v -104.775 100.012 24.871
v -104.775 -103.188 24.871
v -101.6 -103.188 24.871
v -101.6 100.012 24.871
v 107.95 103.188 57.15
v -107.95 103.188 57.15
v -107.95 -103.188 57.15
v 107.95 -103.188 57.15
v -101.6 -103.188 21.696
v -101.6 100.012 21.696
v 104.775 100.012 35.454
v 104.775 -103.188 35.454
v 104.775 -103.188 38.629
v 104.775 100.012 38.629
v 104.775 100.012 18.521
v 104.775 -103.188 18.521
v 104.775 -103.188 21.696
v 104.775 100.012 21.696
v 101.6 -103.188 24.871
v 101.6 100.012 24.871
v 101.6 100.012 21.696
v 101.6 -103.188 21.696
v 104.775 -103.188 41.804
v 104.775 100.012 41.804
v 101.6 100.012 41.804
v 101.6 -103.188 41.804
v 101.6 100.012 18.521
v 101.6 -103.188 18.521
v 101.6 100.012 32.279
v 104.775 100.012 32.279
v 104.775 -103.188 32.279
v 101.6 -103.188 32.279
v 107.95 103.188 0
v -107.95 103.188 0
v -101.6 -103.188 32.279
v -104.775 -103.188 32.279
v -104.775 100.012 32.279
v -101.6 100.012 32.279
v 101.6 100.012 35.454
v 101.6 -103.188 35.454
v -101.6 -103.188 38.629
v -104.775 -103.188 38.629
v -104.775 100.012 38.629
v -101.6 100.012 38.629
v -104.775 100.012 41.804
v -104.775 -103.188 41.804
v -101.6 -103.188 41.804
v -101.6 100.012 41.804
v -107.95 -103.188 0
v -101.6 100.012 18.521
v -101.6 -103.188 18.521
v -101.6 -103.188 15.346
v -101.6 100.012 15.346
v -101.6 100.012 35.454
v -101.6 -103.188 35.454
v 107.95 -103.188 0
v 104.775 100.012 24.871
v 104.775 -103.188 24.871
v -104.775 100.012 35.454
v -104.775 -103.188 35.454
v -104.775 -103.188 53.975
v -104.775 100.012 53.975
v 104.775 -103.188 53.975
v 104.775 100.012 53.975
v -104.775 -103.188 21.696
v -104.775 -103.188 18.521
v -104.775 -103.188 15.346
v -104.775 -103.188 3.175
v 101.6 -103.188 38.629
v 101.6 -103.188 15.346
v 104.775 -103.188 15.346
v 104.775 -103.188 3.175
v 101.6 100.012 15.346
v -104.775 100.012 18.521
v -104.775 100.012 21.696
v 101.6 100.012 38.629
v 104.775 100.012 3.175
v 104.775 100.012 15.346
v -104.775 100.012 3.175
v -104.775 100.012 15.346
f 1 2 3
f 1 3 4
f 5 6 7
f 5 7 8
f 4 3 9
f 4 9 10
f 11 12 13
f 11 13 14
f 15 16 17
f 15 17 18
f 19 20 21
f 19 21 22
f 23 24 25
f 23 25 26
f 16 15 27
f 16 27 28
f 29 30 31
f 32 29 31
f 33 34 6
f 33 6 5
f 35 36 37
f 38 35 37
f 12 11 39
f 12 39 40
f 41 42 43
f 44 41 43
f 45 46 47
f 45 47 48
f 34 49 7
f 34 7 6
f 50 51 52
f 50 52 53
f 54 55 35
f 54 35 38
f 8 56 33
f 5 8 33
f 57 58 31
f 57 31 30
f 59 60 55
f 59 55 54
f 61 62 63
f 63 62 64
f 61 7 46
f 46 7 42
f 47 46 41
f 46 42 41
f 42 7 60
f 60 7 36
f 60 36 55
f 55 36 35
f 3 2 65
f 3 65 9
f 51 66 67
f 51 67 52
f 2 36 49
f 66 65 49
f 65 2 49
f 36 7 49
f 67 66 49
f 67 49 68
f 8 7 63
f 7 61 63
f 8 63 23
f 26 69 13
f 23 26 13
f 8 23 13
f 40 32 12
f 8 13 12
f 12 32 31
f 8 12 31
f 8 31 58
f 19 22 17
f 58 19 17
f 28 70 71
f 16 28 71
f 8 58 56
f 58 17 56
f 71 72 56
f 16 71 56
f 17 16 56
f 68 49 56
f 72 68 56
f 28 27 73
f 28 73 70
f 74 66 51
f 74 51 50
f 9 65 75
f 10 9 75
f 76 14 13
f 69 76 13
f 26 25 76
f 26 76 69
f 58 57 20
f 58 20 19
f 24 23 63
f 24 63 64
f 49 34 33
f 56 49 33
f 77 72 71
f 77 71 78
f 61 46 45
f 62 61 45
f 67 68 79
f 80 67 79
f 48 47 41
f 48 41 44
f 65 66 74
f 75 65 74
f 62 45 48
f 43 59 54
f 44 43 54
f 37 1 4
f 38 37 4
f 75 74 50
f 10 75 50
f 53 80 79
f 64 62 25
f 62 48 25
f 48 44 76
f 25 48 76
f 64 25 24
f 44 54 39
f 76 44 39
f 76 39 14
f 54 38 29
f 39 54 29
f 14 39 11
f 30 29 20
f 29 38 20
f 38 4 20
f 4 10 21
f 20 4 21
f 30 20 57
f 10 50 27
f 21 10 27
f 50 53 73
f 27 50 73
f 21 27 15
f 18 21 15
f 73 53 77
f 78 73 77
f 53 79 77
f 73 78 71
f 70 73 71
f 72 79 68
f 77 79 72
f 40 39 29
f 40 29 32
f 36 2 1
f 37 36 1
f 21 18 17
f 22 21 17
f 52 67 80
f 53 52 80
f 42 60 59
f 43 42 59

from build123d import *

# Parameters (mm, degrees)
F0_W     = 215.9
F0_H     = 206.375
F1_DEPTH = 57.15
F2_T     = -3.175
F3_W     = 203.2
F3_H     = 3.175
F4_DEPTH = 3.175
F5_W     = 203.2
F5_H     = 3.175
F6_DEPTH = 3.175


with BuildPart() as f1:
    # F0 (on Top) → F1 (new body)
    with BuildSketch(Plane.XY):
        Rectangle(F0_W, F0_H)
    extrude(amount=F1_DEPTH)

    # F2
    f2_openings = [f1.faces().sort_by_distance(p)[0] for p in [
        (0, -103.1875, 28.575),
    ]]
    offset(amount=F2_T, openings=f2_openings)

    # F3 (on face) → F4 (join)
    with BuildSketch(Plane.YZ.offset(-104.775)):
        with Locations((-1.5875, 40.2166666663)):
            Rectangle(F3_W, F3_H)
        with Locations((-1.5875, 33.8666666663)):
            Rectangle(F3_W, F3_H)
        with Locations((-1.5875, 23.2833333337)):
            Rectangle(F3_W, F3_H)
        with Locations((-1.5875, 16.9333333337)):
            Rectangle(F3_W, F3_H)
    extrude(amount=F4_DEPTH)

    # F5 (on face) → F6 (join)
    with BuildSketch(Plane(origin=(104.775, 0, 0), x_dir=(0, -1, 0), z_dir=(-1, 0, 0))):
        with Locations((1.5875, 40.2166666663)):
            Rectangle(F5_W, F5_H)
        with Locations((1.5875, 33.8666666663)):
            Rectangle(F5_W, F5_H)
        with Locations((1.5875, 23.2833333337)):
            Rectangle(F5_W, F5_H)
        with Locations((1.5875, 16.9333333337)):
            Rectangle(F5_W, F5_H)
    extrude(amount=F6_DEPTH)


solid = f1.part
